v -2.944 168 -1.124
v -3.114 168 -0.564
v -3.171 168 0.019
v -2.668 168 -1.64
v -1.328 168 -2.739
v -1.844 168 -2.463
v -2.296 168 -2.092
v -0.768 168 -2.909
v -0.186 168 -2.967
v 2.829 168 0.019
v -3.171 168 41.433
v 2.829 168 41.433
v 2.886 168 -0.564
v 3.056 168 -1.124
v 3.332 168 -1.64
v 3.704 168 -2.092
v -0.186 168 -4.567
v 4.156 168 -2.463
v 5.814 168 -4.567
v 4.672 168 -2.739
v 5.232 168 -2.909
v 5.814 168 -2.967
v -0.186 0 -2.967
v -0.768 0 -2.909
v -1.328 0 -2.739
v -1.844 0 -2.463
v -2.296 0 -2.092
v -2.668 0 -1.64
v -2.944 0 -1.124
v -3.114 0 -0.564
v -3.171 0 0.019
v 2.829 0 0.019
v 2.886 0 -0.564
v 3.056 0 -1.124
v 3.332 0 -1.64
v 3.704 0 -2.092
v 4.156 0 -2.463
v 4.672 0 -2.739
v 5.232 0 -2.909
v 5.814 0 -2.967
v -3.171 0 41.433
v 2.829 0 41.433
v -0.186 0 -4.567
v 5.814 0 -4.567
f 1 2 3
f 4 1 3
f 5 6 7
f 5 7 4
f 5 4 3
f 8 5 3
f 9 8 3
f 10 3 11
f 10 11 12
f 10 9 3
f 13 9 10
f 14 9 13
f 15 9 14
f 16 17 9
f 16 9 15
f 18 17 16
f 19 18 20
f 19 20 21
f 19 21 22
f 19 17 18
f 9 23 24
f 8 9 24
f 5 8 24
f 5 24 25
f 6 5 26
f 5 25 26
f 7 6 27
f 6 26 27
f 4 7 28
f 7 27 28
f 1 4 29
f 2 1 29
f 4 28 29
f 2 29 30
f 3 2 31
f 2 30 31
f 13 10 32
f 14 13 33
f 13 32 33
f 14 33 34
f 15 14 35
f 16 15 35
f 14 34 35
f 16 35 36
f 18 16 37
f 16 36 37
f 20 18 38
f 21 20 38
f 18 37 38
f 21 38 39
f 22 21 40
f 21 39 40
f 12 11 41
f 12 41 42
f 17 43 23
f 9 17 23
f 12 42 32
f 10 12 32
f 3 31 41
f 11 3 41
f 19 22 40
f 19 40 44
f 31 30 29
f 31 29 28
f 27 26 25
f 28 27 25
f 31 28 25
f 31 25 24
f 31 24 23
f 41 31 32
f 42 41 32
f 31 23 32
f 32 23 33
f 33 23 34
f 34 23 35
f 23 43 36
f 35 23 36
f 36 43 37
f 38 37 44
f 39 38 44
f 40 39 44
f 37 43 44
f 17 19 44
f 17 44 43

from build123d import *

# Parameters (mm, degrees)
BOSS_EXTRUDE1_DEPTH = 168


with BuildPart() as part:
    # Sketch1 → Boss-Extrude1 (new body)
    with BuildSketch(Plane(origin=(0, 0, 0), x_dir=(1, 0, 0), z_dir=(0, 1, 0))):
        with BuildLine():
            Line((5.814470124, 4.566536611), (2.829130053, 4.566536611))
            Line((2.829130053, 4.566536611), (2.829130053, -0.01880346))
            ThreePointArc((2.829130053, -0.01880346), (3.703515915, 2.092150748), (5.814470124, 2.966536611))
            Line((5.814470124, 2.966536611), (5.814470124, 4.566536611))
        make_face()
        with BuildLine():
            Line((2.829130053, -0.01880346), (2.829130053, 4.566536611))
            Line((2.829130053, 4.566536611), (-0.185529876, 4.566536611))
            Line((-0.185529876, 4.566536611), (-0.185529876, 2.966536611))
            ThreePointArc((-0.185529876, 2.966536611), (-2.296484085, 2.092150748), (-3.170869947, -0.01880346))
            Line((-3.170869947, -0.01880346), (-3.170869947, -41.433463389))
            Line((-3.170869947, -41.433463389), (2.829130053, -41.433463389))
            Line((2.829130053, -41.433463389), (2.829130053, -0.01880346))
        make_face()
    extrude(amount=BOSS_EXTRUDE1_DEPTH)


solid = part.part
